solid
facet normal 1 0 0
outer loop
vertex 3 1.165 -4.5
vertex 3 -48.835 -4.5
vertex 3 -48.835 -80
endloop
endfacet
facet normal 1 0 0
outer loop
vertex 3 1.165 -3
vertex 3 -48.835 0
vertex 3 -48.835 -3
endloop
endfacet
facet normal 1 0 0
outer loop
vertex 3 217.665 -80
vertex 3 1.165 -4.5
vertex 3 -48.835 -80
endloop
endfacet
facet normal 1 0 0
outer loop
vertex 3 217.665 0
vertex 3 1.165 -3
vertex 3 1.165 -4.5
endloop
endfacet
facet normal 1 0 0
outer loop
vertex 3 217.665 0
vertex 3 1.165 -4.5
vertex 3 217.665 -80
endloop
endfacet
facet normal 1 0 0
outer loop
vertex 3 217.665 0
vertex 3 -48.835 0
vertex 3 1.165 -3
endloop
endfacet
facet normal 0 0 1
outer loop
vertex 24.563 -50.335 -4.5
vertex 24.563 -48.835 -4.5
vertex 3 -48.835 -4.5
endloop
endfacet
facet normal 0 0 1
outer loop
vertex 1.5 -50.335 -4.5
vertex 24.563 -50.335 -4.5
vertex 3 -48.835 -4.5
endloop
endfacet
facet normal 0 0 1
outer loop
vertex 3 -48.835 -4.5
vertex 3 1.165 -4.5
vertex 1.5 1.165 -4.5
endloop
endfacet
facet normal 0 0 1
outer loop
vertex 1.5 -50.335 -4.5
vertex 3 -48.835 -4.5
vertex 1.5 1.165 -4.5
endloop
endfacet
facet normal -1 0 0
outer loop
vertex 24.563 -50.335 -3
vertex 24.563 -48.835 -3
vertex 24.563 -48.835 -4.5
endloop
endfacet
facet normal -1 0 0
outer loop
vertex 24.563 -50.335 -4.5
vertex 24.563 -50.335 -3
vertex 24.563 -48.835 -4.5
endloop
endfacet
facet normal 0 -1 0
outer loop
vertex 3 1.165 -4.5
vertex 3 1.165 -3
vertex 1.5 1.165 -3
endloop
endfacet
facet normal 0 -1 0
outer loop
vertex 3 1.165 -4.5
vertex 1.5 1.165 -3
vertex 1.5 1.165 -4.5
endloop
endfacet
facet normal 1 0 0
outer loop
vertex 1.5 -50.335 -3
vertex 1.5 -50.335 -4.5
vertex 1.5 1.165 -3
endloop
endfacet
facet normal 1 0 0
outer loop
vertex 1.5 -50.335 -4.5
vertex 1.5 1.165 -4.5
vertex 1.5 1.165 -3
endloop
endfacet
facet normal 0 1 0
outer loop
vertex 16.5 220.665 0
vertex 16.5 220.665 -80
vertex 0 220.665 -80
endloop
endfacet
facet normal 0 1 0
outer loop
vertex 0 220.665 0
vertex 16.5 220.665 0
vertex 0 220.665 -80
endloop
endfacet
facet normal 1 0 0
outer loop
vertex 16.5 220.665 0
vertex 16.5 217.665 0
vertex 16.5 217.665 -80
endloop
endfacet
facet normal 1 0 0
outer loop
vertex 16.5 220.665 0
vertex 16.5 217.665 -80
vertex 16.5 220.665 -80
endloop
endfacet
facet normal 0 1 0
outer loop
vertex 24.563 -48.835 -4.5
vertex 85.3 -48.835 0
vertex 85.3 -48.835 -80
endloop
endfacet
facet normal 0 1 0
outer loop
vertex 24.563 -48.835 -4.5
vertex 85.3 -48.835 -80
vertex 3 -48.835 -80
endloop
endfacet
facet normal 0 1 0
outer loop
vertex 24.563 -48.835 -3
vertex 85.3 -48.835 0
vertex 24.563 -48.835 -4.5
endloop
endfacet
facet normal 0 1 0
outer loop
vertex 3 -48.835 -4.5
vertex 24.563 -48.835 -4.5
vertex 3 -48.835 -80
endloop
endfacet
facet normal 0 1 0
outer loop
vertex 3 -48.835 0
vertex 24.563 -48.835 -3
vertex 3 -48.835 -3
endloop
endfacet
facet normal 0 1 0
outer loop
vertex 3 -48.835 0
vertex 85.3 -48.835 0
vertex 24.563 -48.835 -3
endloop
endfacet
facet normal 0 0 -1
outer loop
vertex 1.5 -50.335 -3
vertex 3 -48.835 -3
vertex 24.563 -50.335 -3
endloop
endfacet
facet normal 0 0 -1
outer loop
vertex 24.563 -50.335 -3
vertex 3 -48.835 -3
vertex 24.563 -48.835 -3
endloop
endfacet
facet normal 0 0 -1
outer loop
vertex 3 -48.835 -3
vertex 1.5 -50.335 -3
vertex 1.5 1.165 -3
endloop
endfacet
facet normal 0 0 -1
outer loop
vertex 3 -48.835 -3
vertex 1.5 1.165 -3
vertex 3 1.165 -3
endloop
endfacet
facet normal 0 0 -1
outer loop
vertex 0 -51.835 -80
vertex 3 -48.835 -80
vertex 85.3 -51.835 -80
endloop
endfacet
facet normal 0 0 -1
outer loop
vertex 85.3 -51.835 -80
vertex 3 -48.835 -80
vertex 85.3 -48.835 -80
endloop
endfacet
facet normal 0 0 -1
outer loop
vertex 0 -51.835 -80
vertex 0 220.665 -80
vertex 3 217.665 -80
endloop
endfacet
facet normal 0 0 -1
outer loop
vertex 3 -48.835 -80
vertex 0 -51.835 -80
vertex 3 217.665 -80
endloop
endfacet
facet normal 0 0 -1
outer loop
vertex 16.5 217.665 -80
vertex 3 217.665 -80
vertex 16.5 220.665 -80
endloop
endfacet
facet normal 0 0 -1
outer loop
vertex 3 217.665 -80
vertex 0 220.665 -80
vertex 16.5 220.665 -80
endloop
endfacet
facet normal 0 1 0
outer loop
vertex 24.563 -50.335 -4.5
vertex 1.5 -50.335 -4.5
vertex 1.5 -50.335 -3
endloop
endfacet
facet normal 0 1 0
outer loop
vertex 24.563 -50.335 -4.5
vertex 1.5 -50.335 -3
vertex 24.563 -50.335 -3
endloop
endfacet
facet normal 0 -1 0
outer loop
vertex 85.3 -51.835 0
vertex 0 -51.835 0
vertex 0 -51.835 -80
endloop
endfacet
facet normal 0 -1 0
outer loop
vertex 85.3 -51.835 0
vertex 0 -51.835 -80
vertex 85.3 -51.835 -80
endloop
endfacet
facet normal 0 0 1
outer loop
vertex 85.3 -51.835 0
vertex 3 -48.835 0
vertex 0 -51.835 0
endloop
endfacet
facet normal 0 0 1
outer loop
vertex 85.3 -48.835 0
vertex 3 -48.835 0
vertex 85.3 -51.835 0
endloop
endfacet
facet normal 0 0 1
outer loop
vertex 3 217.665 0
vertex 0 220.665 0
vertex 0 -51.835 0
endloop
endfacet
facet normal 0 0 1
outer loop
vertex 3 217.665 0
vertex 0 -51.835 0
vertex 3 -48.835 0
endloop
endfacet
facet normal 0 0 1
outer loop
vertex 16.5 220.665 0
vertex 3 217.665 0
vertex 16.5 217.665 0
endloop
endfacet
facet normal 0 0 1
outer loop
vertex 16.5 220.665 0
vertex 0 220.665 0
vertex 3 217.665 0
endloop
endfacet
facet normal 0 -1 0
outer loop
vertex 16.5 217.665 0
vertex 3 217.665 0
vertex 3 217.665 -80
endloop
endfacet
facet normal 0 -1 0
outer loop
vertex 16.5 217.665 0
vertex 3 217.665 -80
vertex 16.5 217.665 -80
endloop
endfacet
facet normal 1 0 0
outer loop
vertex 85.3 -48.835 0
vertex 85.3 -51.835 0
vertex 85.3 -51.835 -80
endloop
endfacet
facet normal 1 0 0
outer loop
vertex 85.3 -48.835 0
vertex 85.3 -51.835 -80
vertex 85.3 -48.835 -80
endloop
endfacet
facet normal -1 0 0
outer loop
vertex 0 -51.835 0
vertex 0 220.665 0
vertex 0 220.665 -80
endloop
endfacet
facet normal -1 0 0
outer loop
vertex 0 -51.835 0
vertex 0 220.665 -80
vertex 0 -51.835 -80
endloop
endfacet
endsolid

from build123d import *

# Parameters (mm, degrees)
BOSS_EXTRUDE1_DEPTH = 80
SKETCH2_W           = 1.5
SKETCH2_H           = 50
CUT_EXTRUDE1_DEPTH  = 1.5
CUT_EXTRUDE3_DEPTH  = 1.5


with BuildPart() as part:
    # Sketch1 → Boss-Extrude1 (new body)
    with BuildSketch(Plane.XY):
        Polygon((0, 220.664977974), (0, -51.835022026), (85.3, -51.835022026), (85.3, -48.835022026), (3, -48.835022026), (3, 217.664977974), (16.5, 217.664977974), (16.5, 220.664977974), align=None)
    extrude(amount=-BOSS_EXTRUDE1_DEPTH)

    # Sketch2 → Cut-Extrude1 (cut)
    with BuildSketch(Plane(origin=(3, 0, 0), x_dir=(0, 0, -1), z_dir=(1, 0, 0))):
        with Locations((3.75, -23.835022026)):
            Rectangle(SKETCH2_W, SKETCH2_H)
    extrude(amount=-CUT_EXTRUDE1_DEPTH, mode=Mode.SUBTRACT)

    # Sketch3 → Cut-Extrude3 (cut)
    with BuildSketch(Plane(origin=(0, -48.835022026, 0), x_dir=(1, 0, 0), z_dir=(0, 1, 0))):
        Polygon((2.83445579, 3), (24.563412283, 3), (24.563412283, 4.5), (1.5, 4.5), (1.5, 3), align=None)
    extrude(amount=-CUT_EXTRUDE3_DEPTH, mode=Mode.SUBTRACT)


solid = part.part
